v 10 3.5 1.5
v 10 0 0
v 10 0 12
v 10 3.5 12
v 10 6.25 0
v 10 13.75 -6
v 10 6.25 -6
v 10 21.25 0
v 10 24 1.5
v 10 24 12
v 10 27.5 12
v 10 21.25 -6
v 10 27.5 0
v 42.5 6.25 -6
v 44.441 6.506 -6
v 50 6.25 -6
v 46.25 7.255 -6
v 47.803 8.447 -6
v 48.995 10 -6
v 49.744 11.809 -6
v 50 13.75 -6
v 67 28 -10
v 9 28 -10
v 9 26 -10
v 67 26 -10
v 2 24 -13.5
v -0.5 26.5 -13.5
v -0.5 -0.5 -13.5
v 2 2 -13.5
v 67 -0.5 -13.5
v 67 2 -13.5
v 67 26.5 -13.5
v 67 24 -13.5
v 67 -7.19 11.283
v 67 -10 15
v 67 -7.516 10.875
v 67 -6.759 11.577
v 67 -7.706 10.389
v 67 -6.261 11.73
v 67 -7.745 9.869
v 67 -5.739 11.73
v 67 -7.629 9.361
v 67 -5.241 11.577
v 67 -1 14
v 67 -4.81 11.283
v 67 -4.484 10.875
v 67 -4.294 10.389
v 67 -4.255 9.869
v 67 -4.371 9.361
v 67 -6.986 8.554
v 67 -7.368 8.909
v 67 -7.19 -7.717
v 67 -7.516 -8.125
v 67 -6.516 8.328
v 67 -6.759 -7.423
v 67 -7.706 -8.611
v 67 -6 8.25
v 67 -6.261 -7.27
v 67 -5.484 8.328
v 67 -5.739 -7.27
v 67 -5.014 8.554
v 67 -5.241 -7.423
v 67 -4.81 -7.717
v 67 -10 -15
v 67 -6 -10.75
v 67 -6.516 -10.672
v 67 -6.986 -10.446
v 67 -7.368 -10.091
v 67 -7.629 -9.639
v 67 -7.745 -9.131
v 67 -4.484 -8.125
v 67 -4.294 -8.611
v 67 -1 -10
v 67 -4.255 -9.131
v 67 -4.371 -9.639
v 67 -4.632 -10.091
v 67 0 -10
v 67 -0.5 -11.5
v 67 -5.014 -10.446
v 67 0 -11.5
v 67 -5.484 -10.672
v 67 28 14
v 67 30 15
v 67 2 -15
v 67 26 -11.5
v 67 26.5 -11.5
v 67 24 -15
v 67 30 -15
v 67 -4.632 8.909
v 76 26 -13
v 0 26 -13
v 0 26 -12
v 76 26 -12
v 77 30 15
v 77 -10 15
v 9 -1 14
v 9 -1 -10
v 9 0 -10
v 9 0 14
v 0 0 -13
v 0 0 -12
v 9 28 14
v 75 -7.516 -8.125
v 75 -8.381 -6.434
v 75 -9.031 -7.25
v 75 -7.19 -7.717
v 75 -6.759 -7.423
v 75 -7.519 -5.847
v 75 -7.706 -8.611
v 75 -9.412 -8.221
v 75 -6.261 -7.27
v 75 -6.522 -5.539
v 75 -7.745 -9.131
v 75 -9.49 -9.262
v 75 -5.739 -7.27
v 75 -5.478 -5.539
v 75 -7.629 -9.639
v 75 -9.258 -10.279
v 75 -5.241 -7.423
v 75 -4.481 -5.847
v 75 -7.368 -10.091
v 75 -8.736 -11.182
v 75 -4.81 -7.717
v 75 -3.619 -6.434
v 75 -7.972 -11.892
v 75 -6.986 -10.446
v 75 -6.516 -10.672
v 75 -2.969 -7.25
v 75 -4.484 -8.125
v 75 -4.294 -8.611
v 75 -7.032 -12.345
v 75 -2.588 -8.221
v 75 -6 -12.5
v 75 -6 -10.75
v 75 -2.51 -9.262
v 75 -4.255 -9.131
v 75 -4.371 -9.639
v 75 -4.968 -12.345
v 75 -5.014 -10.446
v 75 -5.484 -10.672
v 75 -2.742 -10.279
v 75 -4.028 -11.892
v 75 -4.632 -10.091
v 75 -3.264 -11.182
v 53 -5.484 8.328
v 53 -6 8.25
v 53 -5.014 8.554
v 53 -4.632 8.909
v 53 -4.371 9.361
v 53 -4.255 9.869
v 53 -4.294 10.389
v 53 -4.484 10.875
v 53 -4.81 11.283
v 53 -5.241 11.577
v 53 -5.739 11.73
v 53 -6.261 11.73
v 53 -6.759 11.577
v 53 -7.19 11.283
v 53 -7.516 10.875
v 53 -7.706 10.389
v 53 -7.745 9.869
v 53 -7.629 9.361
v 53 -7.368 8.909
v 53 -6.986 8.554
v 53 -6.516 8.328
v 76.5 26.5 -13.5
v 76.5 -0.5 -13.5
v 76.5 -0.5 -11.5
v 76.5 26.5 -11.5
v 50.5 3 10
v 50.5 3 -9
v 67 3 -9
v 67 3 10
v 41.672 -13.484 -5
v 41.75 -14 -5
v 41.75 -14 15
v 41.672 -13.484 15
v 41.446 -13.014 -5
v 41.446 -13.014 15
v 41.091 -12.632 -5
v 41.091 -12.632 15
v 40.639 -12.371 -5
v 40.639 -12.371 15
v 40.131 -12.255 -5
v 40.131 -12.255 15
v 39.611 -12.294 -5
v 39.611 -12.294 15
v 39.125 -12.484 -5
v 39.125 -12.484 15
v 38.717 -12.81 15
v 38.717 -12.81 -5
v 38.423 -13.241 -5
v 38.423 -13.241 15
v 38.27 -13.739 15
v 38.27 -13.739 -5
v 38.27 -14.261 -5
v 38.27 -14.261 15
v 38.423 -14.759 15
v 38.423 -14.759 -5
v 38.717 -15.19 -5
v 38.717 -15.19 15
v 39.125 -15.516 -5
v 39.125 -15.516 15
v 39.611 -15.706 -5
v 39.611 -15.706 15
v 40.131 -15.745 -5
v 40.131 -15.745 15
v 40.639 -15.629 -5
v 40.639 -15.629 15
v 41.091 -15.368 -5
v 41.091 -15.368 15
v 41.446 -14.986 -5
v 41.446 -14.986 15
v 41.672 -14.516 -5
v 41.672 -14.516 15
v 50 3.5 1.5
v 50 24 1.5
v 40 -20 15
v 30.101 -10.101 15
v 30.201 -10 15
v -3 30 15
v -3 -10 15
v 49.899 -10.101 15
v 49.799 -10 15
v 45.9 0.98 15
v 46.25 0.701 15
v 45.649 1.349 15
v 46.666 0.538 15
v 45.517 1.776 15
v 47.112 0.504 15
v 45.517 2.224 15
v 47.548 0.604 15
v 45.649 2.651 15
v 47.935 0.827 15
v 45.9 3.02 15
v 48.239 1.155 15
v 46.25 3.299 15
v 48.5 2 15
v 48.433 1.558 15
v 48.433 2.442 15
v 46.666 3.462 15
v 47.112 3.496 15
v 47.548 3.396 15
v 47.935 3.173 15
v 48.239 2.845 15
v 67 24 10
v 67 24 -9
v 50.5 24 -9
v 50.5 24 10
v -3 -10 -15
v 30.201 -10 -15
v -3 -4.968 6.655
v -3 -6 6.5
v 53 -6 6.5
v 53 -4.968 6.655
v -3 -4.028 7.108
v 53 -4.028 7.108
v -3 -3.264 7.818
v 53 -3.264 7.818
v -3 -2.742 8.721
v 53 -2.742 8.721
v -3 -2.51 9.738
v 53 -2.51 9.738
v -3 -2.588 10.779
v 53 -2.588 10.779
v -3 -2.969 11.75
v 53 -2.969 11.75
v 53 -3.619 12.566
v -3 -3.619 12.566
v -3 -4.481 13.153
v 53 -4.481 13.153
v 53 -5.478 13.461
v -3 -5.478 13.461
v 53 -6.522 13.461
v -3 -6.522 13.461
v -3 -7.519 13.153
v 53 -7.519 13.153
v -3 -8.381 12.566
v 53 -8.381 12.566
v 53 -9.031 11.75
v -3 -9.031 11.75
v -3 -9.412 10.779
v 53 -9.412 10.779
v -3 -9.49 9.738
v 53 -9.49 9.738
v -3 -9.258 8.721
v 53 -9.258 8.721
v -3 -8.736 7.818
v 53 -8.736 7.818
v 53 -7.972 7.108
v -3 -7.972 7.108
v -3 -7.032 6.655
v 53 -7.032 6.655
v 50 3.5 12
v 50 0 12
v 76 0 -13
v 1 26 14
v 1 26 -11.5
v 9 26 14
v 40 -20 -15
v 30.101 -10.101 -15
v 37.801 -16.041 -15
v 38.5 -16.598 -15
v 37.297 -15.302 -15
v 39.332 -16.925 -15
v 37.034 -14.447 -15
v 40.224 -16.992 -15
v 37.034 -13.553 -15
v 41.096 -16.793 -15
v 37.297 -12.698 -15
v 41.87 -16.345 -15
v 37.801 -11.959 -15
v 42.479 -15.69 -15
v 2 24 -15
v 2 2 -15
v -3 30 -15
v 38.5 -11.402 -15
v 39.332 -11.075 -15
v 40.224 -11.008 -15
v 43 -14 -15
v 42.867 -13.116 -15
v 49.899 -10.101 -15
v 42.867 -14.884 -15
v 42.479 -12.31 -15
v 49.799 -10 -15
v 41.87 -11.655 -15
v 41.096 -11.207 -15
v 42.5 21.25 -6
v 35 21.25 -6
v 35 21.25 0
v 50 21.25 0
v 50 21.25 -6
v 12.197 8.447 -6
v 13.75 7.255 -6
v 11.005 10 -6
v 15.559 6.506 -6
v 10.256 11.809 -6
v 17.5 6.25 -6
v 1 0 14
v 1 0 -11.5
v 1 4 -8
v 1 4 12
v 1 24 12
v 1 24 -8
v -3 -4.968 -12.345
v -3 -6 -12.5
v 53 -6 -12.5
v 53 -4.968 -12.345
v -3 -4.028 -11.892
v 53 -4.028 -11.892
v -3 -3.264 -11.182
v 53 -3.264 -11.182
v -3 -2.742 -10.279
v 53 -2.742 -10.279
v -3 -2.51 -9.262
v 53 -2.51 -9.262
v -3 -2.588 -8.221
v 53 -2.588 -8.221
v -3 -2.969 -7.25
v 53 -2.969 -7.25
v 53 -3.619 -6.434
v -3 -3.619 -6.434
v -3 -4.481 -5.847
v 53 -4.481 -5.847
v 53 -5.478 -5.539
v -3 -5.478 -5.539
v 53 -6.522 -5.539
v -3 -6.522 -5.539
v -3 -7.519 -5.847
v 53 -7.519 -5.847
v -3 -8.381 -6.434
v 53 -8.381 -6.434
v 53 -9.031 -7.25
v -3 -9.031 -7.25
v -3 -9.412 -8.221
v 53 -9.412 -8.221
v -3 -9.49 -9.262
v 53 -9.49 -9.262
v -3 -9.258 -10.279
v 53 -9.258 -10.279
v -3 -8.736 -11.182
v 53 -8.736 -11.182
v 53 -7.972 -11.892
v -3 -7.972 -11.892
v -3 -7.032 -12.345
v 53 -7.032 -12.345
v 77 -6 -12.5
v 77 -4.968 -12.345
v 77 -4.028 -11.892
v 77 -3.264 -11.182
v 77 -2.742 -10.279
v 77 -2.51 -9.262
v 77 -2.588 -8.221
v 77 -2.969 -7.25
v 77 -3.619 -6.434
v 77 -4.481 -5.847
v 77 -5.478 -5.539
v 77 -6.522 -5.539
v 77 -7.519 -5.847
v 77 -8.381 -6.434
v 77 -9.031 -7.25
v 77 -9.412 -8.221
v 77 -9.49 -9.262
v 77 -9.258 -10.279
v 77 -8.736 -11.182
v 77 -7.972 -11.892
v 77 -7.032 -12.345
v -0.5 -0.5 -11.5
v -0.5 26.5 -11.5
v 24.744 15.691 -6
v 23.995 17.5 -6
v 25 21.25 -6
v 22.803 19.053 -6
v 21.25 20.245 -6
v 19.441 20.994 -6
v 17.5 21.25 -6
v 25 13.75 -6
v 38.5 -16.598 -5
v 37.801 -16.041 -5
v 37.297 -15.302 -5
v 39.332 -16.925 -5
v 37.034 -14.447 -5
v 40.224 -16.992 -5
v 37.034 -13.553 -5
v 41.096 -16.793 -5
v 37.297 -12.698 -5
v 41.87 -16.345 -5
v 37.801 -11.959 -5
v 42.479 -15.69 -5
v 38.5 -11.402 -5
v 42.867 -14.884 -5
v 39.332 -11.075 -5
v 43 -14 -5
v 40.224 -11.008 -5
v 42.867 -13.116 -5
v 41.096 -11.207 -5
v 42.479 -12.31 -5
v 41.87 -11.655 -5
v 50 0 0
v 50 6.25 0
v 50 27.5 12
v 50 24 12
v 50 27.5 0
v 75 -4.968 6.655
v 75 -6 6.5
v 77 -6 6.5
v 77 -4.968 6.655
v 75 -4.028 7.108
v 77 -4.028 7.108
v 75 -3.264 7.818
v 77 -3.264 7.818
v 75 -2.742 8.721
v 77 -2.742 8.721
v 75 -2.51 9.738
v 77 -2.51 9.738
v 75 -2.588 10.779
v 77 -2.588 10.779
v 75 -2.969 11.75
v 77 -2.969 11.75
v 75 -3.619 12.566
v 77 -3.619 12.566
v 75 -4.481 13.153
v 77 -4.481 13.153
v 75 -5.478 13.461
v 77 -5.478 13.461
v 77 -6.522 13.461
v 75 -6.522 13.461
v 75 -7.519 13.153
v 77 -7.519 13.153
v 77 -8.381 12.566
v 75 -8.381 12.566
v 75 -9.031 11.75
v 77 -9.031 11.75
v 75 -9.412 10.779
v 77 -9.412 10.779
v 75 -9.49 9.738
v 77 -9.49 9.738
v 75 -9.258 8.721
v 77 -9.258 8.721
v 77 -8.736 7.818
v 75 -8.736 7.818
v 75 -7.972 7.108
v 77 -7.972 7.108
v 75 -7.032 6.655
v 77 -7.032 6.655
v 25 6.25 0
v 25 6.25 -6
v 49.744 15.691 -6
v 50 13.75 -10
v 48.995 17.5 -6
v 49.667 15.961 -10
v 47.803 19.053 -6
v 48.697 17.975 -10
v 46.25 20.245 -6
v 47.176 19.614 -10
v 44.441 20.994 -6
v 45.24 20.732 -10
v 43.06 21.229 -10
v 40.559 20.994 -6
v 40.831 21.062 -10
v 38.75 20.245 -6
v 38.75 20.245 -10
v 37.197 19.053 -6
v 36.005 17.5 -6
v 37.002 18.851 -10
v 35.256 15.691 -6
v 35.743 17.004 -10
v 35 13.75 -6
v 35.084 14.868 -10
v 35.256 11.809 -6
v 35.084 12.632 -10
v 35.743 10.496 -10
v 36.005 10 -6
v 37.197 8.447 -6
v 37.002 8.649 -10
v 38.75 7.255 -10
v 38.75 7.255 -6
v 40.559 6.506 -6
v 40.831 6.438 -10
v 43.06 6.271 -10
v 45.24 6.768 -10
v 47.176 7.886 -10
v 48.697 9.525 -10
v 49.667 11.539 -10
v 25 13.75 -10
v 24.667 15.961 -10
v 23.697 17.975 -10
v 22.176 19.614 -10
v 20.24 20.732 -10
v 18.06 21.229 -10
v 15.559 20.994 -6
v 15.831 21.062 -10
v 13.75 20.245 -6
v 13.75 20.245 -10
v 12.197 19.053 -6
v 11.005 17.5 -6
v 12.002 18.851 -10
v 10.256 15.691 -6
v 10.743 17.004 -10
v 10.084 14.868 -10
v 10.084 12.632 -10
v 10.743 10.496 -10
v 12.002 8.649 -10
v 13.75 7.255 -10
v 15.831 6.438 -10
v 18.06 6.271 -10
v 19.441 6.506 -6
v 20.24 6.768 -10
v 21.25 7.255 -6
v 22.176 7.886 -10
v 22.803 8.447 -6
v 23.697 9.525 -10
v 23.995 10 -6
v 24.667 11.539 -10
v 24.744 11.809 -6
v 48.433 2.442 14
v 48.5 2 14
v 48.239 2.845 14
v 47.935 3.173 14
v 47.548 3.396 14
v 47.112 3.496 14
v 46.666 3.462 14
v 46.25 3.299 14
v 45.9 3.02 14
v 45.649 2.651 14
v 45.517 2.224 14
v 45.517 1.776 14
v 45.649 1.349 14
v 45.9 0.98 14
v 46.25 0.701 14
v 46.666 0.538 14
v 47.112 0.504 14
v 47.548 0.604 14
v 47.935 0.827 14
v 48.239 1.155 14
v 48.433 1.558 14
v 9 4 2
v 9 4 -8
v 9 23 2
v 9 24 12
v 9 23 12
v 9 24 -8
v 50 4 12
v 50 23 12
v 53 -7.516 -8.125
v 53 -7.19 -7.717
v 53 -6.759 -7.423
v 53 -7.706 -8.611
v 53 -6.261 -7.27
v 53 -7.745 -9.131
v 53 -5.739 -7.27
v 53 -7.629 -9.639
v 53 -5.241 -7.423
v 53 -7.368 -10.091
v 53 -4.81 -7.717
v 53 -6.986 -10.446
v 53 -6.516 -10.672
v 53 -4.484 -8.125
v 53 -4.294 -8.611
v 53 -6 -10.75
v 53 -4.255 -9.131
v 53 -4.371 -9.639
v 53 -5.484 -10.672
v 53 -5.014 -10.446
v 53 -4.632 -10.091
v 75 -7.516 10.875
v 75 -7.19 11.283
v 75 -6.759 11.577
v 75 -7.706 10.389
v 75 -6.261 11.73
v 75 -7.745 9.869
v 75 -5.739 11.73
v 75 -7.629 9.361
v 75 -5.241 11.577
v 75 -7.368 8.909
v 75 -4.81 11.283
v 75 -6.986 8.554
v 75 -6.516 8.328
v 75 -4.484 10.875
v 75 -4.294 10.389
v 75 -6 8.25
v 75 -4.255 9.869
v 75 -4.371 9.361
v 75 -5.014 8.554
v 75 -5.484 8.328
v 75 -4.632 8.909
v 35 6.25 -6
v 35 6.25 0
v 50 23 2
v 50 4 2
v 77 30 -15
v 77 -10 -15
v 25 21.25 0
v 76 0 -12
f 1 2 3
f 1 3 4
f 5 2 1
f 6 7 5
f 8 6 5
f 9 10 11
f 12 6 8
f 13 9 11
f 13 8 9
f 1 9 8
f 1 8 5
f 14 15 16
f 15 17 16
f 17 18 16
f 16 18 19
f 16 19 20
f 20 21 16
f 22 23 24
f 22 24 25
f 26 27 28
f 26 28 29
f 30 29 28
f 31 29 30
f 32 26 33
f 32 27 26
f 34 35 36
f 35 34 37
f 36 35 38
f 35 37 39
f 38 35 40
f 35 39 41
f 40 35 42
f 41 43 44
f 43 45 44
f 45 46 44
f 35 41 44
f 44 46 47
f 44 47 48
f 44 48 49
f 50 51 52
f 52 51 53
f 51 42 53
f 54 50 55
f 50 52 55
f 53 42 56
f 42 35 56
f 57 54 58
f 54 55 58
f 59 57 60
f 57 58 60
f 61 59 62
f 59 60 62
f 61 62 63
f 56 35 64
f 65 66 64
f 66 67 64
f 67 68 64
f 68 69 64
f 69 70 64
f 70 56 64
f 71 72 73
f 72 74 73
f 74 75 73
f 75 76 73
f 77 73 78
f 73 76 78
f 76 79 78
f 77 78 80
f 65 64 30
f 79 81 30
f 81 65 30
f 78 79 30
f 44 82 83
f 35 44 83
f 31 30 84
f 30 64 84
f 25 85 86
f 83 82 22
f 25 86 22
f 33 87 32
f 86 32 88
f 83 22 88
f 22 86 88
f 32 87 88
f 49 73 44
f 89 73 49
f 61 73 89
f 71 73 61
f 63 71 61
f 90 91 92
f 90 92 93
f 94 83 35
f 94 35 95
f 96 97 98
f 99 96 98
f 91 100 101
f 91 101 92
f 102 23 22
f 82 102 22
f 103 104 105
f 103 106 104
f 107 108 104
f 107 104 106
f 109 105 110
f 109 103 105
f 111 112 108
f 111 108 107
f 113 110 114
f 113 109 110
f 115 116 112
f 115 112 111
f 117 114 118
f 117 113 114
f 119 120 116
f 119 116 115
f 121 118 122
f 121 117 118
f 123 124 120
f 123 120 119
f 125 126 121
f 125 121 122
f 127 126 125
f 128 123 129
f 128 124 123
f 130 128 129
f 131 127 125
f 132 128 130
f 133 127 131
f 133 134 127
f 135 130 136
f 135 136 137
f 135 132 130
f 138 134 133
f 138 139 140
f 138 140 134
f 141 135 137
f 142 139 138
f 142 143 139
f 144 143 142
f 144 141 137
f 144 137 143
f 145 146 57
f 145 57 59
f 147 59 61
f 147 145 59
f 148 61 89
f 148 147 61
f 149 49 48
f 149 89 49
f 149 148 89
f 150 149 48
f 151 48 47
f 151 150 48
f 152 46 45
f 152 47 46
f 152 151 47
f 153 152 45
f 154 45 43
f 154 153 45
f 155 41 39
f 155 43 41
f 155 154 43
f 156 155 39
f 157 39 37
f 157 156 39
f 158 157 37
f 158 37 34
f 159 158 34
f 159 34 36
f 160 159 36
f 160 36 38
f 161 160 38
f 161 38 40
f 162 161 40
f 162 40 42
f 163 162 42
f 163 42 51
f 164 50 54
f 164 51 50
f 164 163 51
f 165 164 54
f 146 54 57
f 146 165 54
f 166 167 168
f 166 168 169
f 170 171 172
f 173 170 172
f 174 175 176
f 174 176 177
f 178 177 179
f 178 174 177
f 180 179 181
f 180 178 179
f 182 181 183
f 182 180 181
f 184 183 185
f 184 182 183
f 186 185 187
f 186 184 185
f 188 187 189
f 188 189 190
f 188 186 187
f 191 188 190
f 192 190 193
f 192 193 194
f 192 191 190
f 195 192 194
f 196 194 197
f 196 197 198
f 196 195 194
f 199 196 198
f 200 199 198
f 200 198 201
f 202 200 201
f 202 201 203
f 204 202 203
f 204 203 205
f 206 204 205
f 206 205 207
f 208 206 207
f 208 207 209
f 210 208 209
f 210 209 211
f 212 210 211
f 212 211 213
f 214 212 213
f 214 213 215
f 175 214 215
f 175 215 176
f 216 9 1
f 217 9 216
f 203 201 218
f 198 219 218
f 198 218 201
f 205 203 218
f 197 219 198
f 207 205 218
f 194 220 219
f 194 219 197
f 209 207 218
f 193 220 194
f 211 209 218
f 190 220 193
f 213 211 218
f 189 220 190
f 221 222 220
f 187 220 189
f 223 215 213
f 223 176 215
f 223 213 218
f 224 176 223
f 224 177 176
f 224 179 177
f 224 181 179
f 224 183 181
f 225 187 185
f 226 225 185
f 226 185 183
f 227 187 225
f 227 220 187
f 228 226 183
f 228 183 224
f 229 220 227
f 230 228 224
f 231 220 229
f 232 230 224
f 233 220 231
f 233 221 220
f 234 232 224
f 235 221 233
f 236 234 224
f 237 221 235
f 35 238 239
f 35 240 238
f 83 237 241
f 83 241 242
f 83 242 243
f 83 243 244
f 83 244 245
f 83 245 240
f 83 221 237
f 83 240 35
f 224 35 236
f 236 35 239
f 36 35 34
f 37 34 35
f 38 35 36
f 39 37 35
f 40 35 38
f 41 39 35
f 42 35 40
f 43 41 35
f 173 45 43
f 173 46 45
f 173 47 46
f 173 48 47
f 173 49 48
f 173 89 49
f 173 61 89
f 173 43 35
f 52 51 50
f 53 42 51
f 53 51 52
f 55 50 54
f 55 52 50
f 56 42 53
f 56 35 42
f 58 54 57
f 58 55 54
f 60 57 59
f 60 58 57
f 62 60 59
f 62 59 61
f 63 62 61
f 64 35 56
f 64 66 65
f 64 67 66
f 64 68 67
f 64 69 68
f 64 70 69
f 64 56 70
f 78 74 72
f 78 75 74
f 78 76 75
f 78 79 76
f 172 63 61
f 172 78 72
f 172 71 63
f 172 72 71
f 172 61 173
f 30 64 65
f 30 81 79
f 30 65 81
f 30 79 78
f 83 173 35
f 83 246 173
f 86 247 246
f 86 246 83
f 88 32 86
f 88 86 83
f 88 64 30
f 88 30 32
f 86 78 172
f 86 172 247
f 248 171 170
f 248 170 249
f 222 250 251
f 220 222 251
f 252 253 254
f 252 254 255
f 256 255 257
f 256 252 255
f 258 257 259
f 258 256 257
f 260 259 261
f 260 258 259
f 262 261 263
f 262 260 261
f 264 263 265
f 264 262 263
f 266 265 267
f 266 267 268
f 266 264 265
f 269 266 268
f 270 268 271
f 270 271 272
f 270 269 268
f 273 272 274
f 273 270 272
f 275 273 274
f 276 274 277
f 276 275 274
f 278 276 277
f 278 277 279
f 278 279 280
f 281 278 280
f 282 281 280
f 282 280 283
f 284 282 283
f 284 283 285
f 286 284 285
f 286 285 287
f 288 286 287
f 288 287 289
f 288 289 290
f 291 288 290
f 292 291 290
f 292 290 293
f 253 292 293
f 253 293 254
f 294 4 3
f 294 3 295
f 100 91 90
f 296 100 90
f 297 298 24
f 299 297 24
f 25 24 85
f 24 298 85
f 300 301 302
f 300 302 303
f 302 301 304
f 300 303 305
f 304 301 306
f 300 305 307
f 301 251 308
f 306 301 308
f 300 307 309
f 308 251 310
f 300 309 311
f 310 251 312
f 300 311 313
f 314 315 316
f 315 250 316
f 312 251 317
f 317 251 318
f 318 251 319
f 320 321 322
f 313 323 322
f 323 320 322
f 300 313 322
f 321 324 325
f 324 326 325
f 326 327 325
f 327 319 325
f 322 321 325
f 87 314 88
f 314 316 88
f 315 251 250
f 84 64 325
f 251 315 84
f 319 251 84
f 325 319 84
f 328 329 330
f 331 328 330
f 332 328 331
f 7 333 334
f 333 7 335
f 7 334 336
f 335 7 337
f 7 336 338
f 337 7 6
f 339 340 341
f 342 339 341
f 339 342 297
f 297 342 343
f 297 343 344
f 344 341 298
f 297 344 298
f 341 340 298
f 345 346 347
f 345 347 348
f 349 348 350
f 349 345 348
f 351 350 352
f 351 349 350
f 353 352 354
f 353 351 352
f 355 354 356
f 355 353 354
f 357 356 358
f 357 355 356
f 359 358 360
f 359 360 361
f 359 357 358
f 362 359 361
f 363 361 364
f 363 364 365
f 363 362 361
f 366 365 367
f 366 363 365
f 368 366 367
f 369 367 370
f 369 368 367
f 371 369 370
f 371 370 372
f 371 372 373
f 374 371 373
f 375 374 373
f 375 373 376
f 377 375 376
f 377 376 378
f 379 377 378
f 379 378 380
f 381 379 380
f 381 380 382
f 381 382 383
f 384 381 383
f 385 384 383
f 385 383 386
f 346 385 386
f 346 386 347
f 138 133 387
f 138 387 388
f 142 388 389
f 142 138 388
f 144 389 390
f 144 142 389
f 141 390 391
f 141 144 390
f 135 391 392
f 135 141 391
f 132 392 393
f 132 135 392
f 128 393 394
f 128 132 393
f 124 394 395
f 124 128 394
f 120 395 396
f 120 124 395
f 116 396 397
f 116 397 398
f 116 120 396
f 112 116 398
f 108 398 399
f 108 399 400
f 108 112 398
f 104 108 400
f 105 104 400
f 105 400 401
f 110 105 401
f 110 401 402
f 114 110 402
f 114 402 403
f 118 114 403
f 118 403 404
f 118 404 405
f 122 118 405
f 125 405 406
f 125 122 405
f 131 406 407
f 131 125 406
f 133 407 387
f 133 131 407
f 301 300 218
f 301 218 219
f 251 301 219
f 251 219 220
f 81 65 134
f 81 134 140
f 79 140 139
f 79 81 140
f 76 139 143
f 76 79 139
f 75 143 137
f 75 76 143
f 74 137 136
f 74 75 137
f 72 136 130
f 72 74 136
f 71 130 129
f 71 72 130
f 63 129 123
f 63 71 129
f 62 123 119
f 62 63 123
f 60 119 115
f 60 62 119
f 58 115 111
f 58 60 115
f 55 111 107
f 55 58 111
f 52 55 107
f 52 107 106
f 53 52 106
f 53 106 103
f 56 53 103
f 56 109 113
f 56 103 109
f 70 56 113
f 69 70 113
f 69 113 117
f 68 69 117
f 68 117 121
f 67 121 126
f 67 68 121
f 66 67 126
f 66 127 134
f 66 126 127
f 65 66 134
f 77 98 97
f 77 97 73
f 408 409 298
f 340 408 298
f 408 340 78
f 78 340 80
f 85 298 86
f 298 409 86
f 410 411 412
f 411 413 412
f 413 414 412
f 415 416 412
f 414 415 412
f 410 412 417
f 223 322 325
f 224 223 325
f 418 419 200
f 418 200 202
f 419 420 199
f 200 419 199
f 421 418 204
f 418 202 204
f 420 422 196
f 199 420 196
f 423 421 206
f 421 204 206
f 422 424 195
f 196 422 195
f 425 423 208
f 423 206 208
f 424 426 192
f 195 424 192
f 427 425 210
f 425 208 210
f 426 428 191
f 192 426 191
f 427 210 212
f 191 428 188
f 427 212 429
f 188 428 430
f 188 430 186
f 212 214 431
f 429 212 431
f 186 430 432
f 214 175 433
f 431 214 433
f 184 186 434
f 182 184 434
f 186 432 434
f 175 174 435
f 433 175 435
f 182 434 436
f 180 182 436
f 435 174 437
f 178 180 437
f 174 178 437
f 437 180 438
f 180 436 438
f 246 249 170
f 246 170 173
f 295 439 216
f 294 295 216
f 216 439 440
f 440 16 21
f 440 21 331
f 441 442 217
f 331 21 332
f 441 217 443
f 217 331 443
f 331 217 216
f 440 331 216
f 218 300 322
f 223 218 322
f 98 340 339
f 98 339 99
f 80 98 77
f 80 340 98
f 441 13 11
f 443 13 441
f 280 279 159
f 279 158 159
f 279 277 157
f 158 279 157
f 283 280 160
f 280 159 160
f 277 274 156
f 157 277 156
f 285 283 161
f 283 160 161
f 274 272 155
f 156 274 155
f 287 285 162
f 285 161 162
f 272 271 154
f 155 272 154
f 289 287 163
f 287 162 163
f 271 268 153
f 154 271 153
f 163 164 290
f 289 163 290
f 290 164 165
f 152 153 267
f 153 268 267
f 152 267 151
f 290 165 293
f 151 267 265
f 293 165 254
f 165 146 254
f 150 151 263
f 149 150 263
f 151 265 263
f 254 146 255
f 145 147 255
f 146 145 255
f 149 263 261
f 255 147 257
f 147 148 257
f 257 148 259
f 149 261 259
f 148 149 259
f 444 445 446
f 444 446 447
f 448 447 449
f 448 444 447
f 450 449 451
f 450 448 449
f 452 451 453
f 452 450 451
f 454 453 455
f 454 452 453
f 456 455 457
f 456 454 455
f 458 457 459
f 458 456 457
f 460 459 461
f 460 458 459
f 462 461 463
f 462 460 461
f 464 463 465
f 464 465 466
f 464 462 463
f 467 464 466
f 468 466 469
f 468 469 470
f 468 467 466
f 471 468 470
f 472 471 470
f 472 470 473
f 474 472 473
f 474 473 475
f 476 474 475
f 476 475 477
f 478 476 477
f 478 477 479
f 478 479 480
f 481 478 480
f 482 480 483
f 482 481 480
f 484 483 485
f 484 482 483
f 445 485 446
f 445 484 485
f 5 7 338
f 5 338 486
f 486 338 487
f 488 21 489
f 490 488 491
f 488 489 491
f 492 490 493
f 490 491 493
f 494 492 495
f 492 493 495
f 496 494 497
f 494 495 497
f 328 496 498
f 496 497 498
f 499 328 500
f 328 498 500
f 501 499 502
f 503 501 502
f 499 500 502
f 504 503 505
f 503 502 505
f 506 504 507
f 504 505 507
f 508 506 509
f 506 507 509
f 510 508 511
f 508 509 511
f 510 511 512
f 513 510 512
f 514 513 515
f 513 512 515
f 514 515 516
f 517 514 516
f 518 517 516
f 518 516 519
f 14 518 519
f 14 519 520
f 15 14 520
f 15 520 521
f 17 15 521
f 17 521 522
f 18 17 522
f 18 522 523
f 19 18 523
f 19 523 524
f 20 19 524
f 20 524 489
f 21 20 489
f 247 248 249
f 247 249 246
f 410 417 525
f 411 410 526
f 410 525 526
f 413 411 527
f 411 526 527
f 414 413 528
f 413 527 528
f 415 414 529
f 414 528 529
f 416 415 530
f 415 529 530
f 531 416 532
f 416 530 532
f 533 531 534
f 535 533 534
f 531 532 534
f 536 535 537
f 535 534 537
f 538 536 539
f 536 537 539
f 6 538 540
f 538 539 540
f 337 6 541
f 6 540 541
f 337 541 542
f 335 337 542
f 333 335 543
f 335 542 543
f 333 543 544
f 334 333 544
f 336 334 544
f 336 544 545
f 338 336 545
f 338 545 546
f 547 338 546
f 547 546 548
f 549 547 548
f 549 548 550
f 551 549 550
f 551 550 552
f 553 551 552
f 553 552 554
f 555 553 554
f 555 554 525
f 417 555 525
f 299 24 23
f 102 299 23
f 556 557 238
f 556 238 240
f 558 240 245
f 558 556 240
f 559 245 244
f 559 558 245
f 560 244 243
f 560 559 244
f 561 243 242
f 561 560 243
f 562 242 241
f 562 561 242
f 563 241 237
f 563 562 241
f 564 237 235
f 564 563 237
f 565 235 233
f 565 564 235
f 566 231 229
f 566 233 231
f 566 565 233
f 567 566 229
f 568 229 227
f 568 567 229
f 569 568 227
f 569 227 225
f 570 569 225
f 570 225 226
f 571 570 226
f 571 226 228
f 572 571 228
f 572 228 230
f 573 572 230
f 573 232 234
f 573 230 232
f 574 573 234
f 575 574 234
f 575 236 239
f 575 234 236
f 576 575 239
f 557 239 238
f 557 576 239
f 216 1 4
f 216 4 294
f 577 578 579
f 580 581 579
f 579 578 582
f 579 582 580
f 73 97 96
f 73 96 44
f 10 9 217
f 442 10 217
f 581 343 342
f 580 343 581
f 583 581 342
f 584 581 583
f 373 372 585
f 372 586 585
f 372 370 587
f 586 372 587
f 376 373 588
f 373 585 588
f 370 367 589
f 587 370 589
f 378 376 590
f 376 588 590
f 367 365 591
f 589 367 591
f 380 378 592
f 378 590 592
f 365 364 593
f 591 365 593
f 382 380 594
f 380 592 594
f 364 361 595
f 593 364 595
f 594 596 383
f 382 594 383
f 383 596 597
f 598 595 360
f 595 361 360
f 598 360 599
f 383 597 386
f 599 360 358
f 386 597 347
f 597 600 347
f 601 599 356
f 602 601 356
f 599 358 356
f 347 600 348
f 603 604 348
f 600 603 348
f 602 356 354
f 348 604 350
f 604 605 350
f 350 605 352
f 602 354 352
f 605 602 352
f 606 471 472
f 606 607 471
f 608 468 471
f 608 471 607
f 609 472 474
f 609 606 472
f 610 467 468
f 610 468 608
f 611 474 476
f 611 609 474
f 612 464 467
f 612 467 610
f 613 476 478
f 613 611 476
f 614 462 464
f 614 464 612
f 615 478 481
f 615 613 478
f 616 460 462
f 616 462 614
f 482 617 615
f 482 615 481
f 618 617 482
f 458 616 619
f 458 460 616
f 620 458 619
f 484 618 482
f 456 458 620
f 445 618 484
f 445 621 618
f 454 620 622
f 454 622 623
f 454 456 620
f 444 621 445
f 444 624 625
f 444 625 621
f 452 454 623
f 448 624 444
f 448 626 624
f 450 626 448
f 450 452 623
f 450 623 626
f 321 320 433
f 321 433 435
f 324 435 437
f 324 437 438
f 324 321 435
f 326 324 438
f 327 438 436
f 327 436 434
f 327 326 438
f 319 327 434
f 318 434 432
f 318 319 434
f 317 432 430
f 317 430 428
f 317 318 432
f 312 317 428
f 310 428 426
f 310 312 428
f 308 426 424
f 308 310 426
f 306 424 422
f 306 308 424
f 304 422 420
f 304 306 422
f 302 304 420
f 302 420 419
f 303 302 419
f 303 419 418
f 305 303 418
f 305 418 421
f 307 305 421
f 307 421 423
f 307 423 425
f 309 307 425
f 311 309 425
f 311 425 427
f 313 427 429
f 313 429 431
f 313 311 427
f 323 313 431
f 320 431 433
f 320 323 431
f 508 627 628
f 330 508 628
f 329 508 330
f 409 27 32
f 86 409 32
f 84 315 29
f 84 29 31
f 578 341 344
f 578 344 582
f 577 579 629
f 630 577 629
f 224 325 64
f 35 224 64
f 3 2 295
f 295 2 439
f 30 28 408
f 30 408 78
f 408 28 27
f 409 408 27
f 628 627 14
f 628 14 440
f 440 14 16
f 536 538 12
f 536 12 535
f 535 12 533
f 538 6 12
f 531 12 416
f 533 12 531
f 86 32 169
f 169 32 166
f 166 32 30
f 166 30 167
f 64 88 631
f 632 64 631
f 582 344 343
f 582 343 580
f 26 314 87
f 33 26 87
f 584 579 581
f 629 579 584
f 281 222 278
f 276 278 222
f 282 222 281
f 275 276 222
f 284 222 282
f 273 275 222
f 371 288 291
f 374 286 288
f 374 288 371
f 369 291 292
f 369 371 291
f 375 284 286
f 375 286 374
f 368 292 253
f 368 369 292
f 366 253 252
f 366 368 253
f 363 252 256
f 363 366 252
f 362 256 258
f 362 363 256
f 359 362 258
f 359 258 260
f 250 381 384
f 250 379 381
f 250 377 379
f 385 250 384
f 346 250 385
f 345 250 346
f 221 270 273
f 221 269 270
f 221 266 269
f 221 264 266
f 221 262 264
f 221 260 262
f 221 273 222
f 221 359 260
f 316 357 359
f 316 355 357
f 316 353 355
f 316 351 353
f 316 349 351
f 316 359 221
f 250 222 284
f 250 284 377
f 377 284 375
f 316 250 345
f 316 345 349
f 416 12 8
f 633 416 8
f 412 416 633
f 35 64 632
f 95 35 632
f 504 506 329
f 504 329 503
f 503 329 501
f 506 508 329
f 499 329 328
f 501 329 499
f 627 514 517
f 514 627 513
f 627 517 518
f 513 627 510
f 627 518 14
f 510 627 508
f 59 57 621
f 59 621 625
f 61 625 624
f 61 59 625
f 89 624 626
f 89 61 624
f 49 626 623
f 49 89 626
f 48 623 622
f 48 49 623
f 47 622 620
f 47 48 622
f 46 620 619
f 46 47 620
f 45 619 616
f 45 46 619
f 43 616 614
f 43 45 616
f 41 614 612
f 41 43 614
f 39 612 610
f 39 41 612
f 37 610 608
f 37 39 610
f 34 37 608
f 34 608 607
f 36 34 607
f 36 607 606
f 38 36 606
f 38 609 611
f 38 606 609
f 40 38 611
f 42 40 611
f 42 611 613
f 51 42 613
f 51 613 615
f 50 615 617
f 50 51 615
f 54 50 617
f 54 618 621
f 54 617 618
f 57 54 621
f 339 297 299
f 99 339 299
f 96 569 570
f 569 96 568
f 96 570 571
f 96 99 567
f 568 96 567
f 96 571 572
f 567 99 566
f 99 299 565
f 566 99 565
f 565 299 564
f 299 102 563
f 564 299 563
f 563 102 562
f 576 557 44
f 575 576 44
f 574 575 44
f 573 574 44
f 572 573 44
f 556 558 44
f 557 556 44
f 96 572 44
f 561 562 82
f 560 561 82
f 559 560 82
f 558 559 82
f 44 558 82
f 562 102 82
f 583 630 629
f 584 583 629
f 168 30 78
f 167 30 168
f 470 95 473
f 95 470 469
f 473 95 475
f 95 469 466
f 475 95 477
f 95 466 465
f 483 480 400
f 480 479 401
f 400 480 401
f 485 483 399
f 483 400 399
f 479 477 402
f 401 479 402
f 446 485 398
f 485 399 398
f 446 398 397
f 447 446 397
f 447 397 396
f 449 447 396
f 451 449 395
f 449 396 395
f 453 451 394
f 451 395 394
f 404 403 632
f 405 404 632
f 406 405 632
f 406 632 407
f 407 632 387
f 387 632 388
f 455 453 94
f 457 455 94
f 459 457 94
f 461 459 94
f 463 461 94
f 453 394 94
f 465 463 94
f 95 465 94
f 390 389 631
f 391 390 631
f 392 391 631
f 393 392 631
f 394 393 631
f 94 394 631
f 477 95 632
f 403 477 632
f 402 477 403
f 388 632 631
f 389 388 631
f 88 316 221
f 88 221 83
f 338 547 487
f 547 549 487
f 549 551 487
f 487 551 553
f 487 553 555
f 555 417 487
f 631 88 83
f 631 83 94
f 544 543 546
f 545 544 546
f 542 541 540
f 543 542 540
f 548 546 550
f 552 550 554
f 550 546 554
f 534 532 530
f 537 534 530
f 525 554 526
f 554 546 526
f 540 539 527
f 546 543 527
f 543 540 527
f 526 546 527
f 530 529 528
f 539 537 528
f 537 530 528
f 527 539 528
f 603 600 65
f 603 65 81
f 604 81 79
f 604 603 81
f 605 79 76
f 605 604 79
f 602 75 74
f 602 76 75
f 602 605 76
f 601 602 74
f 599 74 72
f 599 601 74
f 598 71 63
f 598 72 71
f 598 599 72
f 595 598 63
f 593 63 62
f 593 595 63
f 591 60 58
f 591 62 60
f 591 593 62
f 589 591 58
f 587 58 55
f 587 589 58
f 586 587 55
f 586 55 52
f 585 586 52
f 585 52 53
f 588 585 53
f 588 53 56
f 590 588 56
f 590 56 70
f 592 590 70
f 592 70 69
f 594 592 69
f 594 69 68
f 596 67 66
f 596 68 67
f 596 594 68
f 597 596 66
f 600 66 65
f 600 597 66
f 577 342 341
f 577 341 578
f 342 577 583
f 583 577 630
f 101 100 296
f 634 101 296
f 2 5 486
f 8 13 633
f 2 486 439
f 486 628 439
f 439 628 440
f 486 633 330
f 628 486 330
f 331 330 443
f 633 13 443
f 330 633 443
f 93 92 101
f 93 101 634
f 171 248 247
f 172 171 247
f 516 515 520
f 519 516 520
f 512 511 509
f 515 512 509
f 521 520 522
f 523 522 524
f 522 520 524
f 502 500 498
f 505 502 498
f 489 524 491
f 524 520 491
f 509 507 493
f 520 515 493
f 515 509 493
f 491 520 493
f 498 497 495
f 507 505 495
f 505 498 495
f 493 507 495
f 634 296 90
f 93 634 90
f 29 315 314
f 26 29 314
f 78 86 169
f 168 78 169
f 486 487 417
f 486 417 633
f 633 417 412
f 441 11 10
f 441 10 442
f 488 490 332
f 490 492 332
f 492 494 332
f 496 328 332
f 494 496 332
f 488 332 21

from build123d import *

# Parameters (mm, degrees)
BOX_W                  = 76
BOX_H                  = 26
BOX_DEPTH              = 1
BOX001_W               = 40
BOX001_H               = 27.5
BOX001_DEPTH           = 1.5
BOX002_W               = 40
BOX002_H               = 3.5
BOX002_DEPTH           = 12
BOX003_W               = 40
BOX003_H               = 3.5
BOX003_DEPTH           = 12
BOX004_W               = 15
BOX004_H               = 15
BOX004_DEPTH           = 6
CYLINDER_R             = 7.5
CYLINDER_DEPTH         = 4
CYLINDER007_R          = 3.5
CYLINDER007_DEPTH      = 2
CYLINDER004_R          = 1.75
CYLINDER004_DEPTH      = 100
CYLINDER003_R          = 1.75
CYLINDER003_DEPTH      = 100
CYLINDER008_R          = 3.5
CYLINDER008_DEPTH      = 2
BOX013_W               = 77
BOX013_H               = 27
BOX013_DEPTH           = 2
BOX012_W               = 10
BOX012_H               = 40
BOX012_DEPTH           = 30
BOX014_W               = 25
BOX014_H               = 21
BOX014_DEPTH           = 19
BOX016_W               = 20
BOX016_H               = 20
BOX016_DEPTH           = 30
CYLINDER010_R          = 1.75
CYLINDER010_DEPTH      = 30
CYLINDER011_R          = 3
CYLINDER011_DEPTH      = 10
BOX015_W               = 14
BOX015_H               = 14
BOX015_DEPTH           = 30
BOX015_PLACEMENT_ANGLE = 45
CYLINDER009_R          = 1.5
CYLINDER009_DEPTH      = 10
CYLINDER006_R          = 3.5
CYLINDER006_DEPTH      = 100
CYLINDER005_R          = 3.5
CYLINDER005_DEPTH      = 100
CYLINDER002_R          = 1.75
CYLINDER002_DEPTH      = 100
CYLINDER001_R          = 1.75
CYLINDER001_DEPTH      = 100
BOX010_W               = 50
BOX010_H               = 19
BOX010_DEPTH           = 10
BOX011_W               = 9
BOX011_H               = 20
BOX011_DEPTH           = 20
BOX009_W               = 100
BOX009_H               = 26
BOX009_DEPTH           = 26
BOX008_W               = 100
BOX008_H               = 29
BOX008_DEPTH           = 24
BOX007_W               = 77
BOX007_H               = 27
BOX007_DEPTH           = 2
BOX006_W               = 72
BOX006_H               = 22
BOX006_DEPTH           = 10
BOX005_W               = 70
BOX005_H               = 40
BOX005_DEPTH           = 30


with BuildPart() as microscopeslide:
    # Box → Box (new body)
    with BuildSketch(Plane.XY.offset(-13)):
        with Locations((38, 13)):
            Rectangle(BOX_W, BOX_H)
    extrude(amount=BOX_DEPTH)


with BuildPart() as cube001:
    # Box001 → Box001 (new body)
    with BuildSketch(Plane.XY):
        with Locations((20, 13.75)):
            Rectangle(BOX001_W, BOX001_H)
    extrude(amount=BOX001_DEPTH)


with BuildPart() as cube:
    # Box002 → Box002 (new body)
    with BuildSketch(Plane.XY):
        with Locations((20, 1.75)):
            Rectangle(BOX002_W, BOX002_H)
    extrude(amount=BOX002_DEPTH)


with BuildPart() as cube002:
    # Box003 → Box003 (new body)
    with BuildSketch(Plane(origin=(0, 24, 0), x_dir=(1, 0, 0), z_dir=(0, 0, 1))):
        with Locations((20, 1.75)):
            Rectangle(BOX003_W, BOX003_H)
    extrude(amount=BOX003_DEPTH)


with BuildPart() as cube003:
    # Box004 → Box004 (new body)
    with BuildSketch(Plane(origin=(0, 6.25, -6), x_dir=(1, 0, 0), z_dir=(0, 0, 1))):
        with Locations((7.5, 7.5)):
            Rectangle(BOX004_W, BOX004_H)
    extrude(amount=BOX004_DEPTH)


with BuildPart() as cylinder:
    # Cylinder → Cylinder (new body)
    with BuildSketch(Plane(origin=(7.5, 13.75, -10), x_dir=(1, 0, 0), z_dir=(0, 0, 1))):
        Circle(CYLINDER_R)
    extrude(amount=CYLINDER_DEPTH)


with BuildPart() as fusion001:
    # Fusion001 base: copy of Cube003
    add(cube003.part)

    # Fusion001: union Cylinder
    add(cylinder.part)


with BuildPart() as fusion001_1:
    # Fusion001 placement: moved
    add(fusion001.part.moved(Location((25, 0, 0))))


with BuildPart() as esp32camtemplate:
    # Fusion base: copy of Cylinder
    add(cylinder.part)

    # Fusion: union Cube001, Cube, Cube002, Cube003, Fusion001
    add(cube001.part)
    add(cube.part)
    add(cube002.part)
    add(cube003.part)
    add(fusion001_1.part)


with BuildPart() as esp32camtemplate_1:
    # Fusion placement: moved
    add(esp32camtemplate.part.moved(Location((10, 0, 0))))


with BuildPart() as cylinder007:
    # Cylinder007 → Cylinder007 (new body)
    with BuildSketch(Plane(origin=(75, -6, 10), x_dir=(0, 0, -1), z_dir=(1, 0, 0))):
        Circle(CYLINDER007_R)
    extrude(amount=CYLINDER007_DEPTH)


with BuildPart() as cylinder004:
    # Cylinder004 → Cylinder004 (new body)
    with BuildSketch(Plane(origin=(-10, -6, 10), x_dir=(0, 0, -1), z_dir=(1, 0, 0))):
        Circle(CYLINDER004_R)
    extrude(amount=CYLINDER004_DEPTH)


with BuildPart() as cylinder003:
    # Cylinder003 → Cylinder003 (new body)
    with BuildSketch(Plane(origin=(-10, -6, -9), x_dir=(0, 0, -1), z_dir=(1, 0, 0))):
        Circle(CYLINDER003_R)
    extrude(amount=CYLINDER003_DEPTH)


with BuildPart() as fusion006:
    # Cylinder008 → Cylinder008 (new body)
    with BuildSketch(Plane(origin=(75, -6, -9), x_dir=(0, 0, -1), z_dir=(1, 0, 0))):
        Circle(CYLINDER008_R)
    extrude(amount=CYLINDER008_DEPTH)

    # Fusion006: union Cylinder007, Cylinder004, Cylinder003
    add(cylinder007.part)
    add(cylinder004.part)
    add(cylinder003.part)


with BuildPart() as microscopeslidemount001:
    # Box013 → Box013 (new body)
    with BuildSketch(Plane(origin=(-0.5, -0.5, -13.5), x_dir=(1, 0, 0), z_dir=(0, 0, 1))):
        with Locations((38.5, 13.5)):
            Rectangle(BOX013_W, BOX013_H)
    extrude(amount=BOX013_DEPTH)


with BuildPart() as cut004:
    # Box012 → Box012 (new body)
    with BuildSketch(Plane(origin=(67, -10, -15), x_dir=(1, 0, 0), z_dir=(0, 0, 1))):
        with Locations((5, 20)):
            Rectangle(BOX012_W, BOX012_H)
    extrude(amount=BOX012_DEPTH)

    # Cut004: cut MicroscopeSlideMount001
    add(microscopeslidemount001.part, mode=Mode.SUBTRACT)


with BuildPart() as housingb:
    # Box014 → Box014 (new body)
    with BuildSketch(Plane(origin=(50.5, 3, -9), x_dir=(1, 0, 0), z_dir=(0, 0, 1))):
        with Locations((12.5, 10.5)):
            Rectangle(BOX014_W, BOX014_H)
    extrude(amount=BOX014_DEPTH)

    # Fusion003: union Cut004
    add(cut004.part)

    # Cut007: cut Fusion006
    add(fusion006.part, mode=Mode.SUBTRACT)


with BuildPart() as cube012:
    # Box016 → Box016 (new body)
    with BuildSketch(Plane(origin=(-10, 7, 0), x_dir=(1, 0, 0), z_dir=(0, 0, 1))):
        with Locations((10, 10)):
            Rectangle(BOX016_W, BOX016_H)
    extrude(amount=BOX016_DEPTH)


with BuildPart() as cylinder010:
    # Cylinder010 → Cylinder010 (new body)
    with BuildSketch(Plane(origin=(0, 3, 0), x_dir=(1, 0, 0), z_dir=(0, 0, 1))):
        Circle(CYLINDER010_R)
    extrude(amount=CYLINDER010_DEPTH)


with BuildPart() as fusion007:
    # Cylinder011 → Cylinder011 (new body)
    with BuildSketch(Plane(origin=(0, 3, 0), x_dir=(1, 0, 0), z_dir=(0, 0, 1))):
        Circle(CYLINDER011_R)
    extrude(amount=CYLINDER011_DEPTH)

    # Fusion007: union Cylinder010
    add(cylinder010.part)


with BuildPart() as cut010:
    # Box015 → Box015 (new body)
    with BuildSketch(Plane.XY):
        with Locations((7, 7)):
            Rectangle(BOX015_W, BOX015_H)
    extrude(amount=BOX015_DEPTH)


with BuildPart() as cut010_1:
    # Box015 placement: moved
    add(cut010.part.moved(Location((0, -3, 0))).rotate(Axis((0, -3, 0), (0, 0, 1)), BOX015_PLACEMENT_ANGLE))

    # Cut009: cut Fusion007
    add(fusion007.part, mode=Mode.SUBTRACT)

    # Cut010: cut Cube012
    add(cube012.part, mode=Mode.SUBTRACT)


with BuildPart() as cut010_2:
    # Cut010 placement: moved
    add(cut010_1.part.moved(Location((40, -17, -15))))


with BuildPart() as cylinder009:
    # Cylinder009 → Cylinder009 (new body)
    with BuildSketch(Plane(origin=(47, 2, 10), x_dir=(1, 0, 0), z_dir=(0, 0, 1))):
        Circle(CYLINDER009_R)
    extrude(amount=CYLINDER009_DEPTH)


with BuildPart() as cylinder006:
    # Cylinder006 → Cylinder006 (new body)
    with BuildSketch(Plane(origin=(-47, -6, -9), x_dir=(0, 0, -1), z_dir=(1, 0, 0))):
        Circle(CYLINDER006_R)
    extrude(amount=CYLINDER006_DEPTH)


with BuildPart() as fusion005:
    # Cylinder005 → Cylinder005 (new body)
    with BuildSketch(Plane(origin=(-47, -6, 10), x_dir=(0, 0, -1), z_dir=(1, 0, 0))):
        Circle(CYLINDER005_R)
    extrude(amount=CYLINDER005_DEPTH)

    # Fusion005: union Cylinder006
    add(cylinder006.part)


with BuildPart() as cylinder002:
    # Cylinder002 → Cylinder002 (new body)
    with BuildSketch(Plane(origin=(-10, -6, 10), x_dir=(0, 0, -1), z_dir=(1, 0, 0))):
        Circle(CYLINDER002_R)
    extrude(amount=CYLINDER002_DEPTH)


with BuildPart() as fusion004:
    # Cylinder001 → Cylinder001 (new body)
    with BuildSketch(Plane(origin=(-10, -6, -9), x_dir=(0, 0, -1), z_dir=(1, 0, 0))):
        Circle(CYLINDER001_R)
    extrude(amount=CYLINDER001_DEPTH)

    # Fusion004: union Cylinder002
    add(cylinder002.part)


with BuildPart() as cube007:
    # Box010 → Box010 (new body)
    with BuildSketch(Plane(origin=(0, 4, 2), x_dir=(1, 0, 0), z_dir=(0, 0, 1))):
        with Locations((25, 9.5)):
            Rectangle(BOX010_W, BOX010_H)
    extrude(amount=BOX010_DEPTH)


with BuildPart() as cube008:
    # Box011 → Box011 (new body)
    with BuildSketch(Plane(origin=(0, 4, -8), x_dir=(1, 0, 0), z_dir=(0, 0, 1))):
        with Locations((4.5, 10)):
            Rectangle(BOX011_W, BOX011_H)
    extrude(amount=BOX011_DEPTH)


with BuildPart() as cube006:
    # Box009 → Box009 (new body)
    with BuildSketch(Plane(origin=(1, 0, -12), x_dir=(1, 0, 0), z_dir=(0, 0, 1))):
        with Locations((50, 13)):
            Rectangle(BOX009_W, BOX009_H)
    extrude(amount=BOX009_DEPTH)


with BuildPart() as cube005:
    # Box008 → Box008 (new body)
    with BuildSketch(Plane(origin=(9, -1, -10), x_dir=(1, 0, 0), z_dir=(0, 0, 1))):
        with Locations((50, 14.5)):
            Rectangle(BOX008_W, BOX008_H)
    extrude(amount=BOX008_DEPTH)


with BuildPart() as microscopeslidemount:
    # Box007 → Box007 (new body)
    with BuildSketch(Plane(origin=(-0.5, -0.5, -13.5), x_dir=(1, 0, 0), z_dir=(0, 0, 1))):
        with Locations((38.5, 13.5)):
            Rectangle(BOX007_W, BOX007_H)
    extrude(amount=BOX007_DEPTH)


with BuildPart() as windowopening:
    # Box006 → Box006 (new body)
    with BuildSketch(Plane(origin=(2, 2, -23), x_dir=(1, 0, 0), z_dir=(0, 0, 1))):
        with Locations((36, 11)):
            Rectangle(BOX006_W, BOX006_H)
    extrude(amount=BOX006_DEPTH)


with BuildPart() as housingawithmount:
    # Box005 → Box005 (new body)
    with BuildSketch(Plane(origin=(-3, -10, -15), x_dir=(1, 0, 0), z_dir=(0, 0, 1))):
        with Locations((35, 20)):
            Rectangle(BOX005_W, BOX005_H)
    extrude(amount=BOX005_DEPTH)

    # Cut: cut WindowOpening
    add(windowopening.part, mode=Mode.SUBTRACT)

    # Cut001: cut MicroscopeSlideMount
    add(microscopeslidemount.part, mode=Mode.SUBTRACT)

    # Cut002: cut Cube005
    add(cube005.part, mode=Mode.SUBTRACT)

    # Cut003: cut Cube006
    add(cube006.part, mode=Mode.SUBTRACT)

    # Fusion002: union Cube007, Cube008
    add(cube007.part)
    add(cube008.part)

    # Cut005: cut Fusion004
    add(fusion004.part, mode=Mode.SUBTRACT)

    # Cut006: cut Fusion005
    add(fusion005.part, mode=Mode.SUBTRACT)

    # Cut008: cut Cylinder009
    add(cylinder009.part, mode=Mode.SUBTRACT)

    # Fusion008: union Cut010
    add(cut010_2.part)


solid = Compound([microscopeslide.part, esp32camtemplate_1.part, housingb.part, housingawithmount.part])
